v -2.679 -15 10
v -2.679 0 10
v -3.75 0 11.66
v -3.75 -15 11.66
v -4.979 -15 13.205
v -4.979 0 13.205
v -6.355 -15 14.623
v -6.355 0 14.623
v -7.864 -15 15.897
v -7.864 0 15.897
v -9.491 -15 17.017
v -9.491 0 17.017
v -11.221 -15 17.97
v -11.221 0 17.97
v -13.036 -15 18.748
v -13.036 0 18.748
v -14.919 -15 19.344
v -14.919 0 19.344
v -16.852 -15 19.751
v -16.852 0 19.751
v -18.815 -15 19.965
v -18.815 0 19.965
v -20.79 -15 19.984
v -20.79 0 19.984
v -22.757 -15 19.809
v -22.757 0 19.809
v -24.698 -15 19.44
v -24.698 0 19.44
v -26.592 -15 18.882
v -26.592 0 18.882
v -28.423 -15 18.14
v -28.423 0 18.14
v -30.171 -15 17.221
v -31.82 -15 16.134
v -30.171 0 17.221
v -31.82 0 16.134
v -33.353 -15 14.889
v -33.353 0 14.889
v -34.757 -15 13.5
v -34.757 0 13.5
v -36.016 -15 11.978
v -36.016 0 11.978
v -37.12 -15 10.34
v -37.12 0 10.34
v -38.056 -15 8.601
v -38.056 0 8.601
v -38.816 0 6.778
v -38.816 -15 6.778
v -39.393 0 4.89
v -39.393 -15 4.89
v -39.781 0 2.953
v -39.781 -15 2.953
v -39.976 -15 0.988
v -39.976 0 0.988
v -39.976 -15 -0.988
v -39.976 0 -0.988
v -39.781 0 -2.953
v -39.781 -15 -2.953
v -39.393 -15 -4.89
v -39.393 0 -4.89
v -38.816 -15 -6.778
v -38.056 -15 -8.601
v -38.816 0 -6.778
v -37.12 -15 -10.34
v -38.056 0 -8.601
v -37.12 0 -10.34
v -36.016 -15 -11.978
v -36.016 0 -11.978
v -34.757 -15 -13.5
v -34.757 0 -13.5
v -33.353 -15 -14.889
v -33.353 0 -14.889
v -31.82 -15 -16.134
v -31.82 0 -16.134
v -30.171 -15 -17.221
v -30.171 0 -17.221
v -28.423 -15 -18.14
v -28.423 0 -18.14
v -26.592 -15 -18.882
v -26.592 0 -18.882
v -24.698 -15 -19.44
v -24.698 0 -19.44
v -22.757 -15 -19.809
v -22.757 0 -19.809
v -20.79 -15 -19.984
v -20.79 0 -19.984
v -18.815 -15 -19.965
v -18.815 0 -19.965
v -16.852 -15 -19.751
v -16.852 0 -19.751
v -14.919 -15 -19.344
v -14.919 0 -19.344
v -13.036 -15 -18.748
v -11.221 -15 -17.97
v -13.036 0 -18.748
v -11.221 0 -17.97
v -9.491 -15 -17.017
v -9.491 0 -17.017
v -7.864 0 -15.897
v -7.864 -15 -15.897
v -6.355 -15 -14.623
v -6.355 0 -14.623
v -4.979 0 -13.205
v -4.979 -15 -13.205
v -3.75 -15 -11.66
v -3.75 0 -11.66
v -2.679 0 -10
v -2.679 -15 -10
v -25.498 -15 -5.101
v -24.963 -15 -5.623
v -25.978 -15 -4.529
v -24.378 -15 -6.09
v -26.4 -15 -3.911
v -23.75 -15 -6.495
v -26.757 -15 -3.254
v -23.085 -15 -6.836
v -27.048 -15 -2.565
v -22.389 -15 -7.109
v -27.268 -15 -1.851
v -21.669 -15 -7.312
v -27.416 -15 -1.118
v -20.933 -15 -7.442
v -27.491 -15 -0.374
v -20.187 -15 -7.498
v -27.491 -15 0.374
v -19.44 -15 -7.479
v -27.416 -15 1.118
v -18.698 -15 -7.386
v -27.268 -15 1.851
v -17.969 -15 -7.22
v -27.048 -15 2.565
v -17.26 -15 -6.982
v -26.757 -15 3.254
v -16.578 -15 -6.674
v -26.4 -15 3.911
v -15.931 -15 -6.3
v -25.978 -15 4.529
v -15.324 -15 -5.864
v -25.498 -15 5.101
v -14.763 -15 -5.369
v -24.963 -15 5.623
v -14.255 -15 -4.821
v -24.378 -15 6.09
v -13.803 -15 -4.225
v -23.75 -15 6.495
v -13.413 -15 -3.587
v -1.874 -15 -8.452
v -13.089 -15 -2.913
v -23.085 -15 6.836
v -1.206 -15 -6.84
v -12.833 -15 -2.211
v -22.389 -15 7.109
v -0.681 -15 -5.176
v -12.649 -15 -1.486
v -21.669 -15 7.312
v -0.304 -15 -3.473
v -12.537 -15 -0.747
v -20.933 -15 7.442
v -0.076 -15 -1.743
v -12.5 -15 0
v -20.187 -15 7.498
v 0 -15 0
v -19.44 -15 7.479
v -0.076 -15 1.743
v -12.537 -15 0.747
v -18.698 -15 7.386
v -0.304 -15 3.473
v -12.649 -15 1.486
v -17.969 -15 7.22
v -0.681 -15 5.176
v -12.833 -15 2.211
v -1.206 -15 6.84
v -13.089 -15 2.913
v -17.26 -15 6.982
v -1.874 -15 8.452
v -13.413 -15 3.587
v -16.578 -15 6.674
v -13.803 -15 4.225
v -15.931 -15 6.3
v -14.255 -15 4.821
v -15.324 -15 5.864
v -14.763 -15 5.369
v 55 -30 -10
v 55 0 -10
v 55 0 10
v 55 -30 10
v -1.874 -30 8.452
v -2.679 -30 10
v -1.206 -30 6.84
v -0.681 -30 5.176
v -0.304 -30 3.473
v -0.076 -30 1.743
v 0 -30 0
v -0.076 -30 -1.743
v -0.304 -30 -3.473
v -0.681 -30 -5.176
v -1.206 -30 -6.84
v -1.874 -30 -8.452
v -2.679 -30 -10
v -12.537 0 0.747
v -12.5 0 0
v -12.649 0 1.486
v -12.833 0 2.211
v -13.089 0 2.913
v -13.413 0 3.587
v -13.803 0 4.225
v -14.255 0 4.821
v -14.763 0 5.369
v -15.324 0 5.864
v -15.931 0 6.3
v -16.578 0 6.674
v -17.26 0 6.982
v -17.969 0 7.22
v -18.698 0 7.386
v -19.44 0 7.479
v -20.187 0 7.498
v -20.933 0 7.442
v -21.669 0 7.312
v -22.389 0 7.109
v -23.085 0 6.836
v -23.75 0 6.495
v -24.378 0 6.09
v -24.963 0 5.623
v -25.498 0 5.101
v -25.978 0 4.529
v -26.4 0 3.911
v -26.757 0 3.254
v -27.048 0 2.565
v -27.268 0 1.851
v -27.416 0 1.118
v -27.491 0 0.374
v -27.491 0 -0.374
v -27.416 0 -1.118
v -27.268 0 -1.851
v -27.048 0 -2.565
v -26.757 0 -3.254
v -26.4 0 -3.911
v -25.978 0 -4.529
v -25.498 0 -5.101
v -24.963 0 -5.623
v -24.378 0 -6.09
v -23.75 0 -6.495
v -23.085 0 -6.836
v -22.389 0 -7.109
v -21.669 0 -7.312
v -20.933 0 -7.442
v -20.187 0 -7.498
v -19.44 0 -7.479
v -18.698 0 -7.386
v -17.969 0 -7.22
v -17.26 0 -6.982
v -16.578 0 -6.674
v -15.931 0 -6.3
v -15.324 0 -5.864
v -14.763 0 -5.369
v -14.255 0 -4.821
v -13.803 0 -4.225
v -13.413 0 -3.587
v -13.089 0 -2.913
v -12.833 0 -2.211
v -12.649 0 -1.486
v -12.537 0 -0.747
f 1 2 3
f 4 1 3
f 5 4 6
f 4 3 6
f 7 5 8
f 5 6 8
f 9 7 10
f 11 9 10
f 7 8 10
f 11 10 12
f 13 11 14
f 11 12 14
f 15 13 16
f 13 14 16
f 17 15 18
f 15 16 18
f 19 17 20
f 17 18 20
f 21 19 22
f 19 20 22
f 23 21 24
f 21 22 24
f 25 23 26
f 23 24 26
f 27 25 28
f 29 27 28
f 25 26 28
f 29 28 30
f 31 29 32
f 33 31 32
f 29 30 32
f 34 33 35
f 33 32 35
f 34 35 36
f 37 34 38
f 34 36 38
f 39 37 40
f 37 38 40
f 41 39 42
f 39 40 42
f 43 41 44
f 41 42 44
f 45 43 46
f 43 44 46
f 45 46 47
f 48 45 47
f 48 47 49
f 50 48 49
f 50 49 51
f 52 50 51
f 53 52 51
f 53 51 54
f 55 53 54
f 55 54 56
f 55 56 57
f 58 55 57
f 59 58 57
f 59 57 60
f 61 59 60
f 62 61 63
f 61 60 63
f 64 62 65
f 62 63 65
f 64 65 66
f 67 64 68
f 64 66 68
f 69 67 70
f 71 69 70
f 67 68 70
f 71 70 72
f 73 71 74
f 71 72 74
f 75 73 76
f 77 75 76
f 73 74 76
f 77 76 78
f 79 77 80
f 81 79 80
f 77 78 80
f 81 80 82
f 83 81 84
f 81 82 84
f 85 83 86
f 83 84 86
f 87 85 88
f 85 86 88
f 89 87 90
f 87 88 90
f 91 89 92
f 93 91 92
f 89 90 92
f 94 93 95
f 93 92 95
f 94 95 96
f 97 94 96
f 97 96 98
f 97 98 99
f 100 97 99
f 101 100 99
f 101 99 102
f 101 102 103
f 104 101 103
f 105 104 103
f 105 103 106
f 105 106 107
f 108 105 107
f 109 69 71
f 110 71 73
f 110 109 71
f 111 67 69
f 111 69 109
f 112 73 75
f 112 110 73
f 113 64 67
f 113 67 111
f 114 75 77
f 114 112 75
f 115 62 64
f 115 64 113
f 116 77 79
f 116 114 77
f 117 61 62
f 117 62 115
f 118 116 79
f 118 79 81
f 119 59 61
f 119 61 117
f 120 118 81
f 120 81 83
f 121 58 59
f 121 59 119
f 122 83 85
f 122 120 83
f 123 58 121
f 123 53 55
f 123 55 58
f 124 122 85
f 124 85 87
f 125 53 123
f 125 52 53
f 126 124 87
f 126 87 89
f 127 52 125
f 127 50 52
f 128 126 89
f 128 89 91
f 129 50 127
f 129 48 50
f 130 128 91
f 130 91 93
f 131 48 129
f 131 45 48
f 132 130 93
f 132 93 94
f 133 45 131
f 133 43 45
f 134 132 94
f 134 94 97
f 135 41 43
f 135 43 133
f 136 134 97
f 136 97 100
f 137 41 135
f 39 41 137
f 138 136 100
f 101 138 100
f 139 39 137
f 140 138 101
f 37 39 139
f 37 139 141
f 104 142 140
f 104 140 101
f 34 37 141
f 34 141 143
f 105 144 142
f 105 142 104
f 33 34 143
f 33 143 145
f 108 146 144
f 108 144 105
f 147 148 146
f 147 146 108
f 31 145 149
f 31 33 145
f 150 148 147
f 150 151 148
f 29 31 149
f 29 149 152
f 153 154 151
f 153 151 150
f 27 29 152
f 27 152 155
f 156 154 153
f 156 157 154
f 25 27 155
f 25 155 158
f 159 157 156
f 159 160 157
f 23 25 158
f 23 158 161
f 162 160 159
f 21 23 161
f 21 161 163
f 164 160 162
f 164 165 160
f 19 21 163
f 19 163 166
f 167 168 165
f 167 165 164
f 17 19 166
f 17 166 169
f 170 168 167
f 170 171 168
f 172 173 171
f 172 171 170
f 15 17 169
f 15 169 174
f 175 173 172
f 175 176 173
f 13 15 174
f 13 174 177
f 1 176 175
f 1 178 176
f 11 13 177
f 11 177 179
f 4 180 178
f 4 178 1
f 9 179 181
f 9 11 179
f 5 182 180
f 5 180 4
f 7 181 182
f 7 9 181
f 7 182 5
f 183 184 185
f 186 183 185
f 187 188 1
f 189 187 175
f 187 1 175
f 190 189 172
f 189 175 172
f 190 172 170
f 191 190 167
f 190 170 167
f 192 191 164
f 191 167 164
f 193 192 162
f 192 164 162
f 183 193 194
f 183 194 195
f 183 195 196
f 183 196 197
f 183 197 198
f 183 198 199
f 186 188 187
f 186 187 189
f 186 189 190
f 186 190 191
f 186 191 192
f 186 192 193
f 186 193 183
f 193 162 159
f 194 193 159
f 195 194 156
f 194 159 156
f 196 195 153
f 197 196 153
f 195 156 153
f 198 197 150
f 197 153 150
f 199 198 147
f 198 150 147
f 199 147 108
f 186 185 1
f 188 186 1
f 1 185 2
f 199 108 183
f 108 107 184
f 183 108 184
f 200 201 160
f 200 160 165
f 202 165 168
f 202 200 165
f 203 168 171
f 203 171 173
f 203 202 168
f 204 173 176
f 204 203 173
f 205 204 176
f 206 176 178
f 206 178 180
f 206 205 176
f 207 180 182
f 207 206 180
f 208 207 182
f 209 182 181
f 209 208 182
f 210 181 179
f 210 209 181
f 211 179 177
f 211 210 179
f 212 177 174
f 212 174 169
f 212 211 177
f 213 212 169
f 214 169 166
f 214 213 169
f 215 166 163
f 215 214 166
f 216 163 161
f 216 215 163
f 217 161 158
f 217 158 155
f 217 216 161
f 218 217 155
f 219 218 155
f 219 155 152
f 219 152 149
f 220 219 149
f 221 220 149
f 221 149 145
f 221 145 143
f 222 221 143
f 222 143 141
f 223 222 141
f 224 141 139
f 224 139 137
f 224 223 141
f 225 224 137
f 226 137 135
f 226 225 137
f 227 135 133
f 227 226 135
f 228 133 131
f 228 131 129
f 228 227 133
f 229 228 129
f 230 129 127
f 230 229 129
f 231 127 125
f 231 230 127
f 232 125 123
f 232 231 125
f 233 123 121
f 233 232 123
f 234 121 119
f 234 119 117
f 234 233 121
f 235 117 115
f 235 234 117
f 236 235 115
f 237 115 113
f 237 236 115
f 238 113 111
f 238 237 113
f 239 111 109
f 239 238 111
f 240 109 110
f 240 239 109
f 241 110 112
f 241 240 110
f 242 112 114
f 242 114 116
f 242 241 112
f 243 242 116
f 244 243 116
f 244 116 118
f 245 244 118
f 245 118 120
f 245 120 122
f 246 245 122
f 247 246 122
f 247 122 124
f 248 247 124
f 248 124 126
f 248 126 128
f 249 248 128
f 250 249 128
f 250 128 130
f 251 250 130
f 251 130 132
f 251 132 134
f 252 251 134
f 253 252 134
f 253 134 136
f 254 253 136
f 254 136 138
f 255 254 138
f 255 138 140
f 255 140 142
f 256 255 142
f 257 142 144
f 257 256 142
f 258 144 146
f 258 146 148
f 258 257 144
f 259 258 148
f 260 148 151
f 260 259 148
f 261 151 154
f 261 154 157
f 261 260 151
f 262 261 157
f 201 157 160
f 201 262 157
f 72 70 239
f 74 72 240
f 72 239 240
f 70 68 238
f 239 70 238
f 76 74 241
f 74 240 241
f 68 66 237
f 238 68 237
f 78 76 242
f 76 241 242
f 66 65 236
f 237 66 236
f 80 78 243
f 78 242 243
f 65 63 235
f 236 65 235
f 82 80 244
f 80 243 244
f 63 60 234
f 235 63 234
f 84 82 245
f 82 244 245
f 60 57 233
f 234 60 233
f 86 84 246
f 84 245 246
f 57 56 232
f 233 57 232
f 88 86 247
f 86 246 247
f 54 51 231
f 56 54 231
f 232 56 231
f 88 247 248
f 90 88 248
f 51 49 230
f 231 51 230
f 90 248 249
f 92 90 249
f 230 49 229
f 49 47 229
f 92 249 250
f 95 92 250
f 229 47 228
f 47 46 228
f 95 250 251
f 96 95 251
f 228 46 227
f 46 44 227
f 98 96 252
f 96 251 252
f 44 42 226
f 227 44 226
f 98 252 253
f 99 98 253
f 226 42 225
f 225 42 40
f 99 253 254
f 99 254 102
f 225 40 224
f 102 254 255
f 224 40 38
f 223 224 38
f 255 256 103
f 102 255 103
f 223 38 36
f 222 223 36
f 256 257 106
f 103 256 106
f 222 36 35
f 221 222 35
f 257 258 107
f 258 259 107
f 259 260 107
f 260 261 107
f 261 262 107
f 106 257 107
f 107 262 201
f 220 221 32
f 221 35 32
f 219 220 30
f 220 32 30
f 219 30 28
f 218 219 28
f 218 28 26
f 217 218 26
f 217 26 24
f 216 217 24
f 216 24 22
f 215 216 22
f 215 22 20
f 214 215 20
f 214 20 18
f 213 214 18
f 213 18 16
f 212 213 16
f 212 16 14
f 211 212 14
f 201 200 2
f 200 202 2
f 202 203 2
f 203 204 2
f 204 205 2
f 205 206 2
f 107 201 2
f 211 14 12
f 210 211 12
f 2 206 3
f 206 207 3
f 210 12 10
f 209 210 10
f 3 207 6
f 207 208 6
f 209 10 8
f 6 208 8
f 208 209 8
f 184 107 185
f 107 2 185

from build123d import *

# Parameters (mm, degrees)
F0_R     = 7.5
F1_DEPTH = 15
F2_DEPTH = 30


with BuildPart() as f1:
    # F0 (on Front) → F1 (new body)
    with BuildSketch(Plane.XZ):
        with BuildLine():
            ThreePointArc((-2.679492, -10), (-0.681483, -5.176381), (0, 0))
            ThreePointArc((0, 0), (-0.681483, 5.176381), (-2.679492, 10))
            ThreePointArc((-2.679492, 10), (-40, 0), (-2.679492, -10))
        make_face()
        with Locations((-20, 0)):
            Circle(F0_R, mode=Mode.SUBTRACT)
    extrude(amount=F1_DEPTH)

    # F0 (on Front) → F2 (join)
    with BuildSketch(Plane.XZ):
        with BuildLine():
            ThreePointArc((-2.679492, 10), (-0.681483, 5.176381), (0, 0))
            ThreePointArc((0, 0), (-0.681483, -5.176381), (-2.679492, -10))
            Line((-2.679492, -10), (55, -10))
            Line((55, -10), (55, 10))
            Line((55, 10), (-2.679492, 10))
        make_face()
    extrude(amount=F2_DEPTH)


solid = f1.part
